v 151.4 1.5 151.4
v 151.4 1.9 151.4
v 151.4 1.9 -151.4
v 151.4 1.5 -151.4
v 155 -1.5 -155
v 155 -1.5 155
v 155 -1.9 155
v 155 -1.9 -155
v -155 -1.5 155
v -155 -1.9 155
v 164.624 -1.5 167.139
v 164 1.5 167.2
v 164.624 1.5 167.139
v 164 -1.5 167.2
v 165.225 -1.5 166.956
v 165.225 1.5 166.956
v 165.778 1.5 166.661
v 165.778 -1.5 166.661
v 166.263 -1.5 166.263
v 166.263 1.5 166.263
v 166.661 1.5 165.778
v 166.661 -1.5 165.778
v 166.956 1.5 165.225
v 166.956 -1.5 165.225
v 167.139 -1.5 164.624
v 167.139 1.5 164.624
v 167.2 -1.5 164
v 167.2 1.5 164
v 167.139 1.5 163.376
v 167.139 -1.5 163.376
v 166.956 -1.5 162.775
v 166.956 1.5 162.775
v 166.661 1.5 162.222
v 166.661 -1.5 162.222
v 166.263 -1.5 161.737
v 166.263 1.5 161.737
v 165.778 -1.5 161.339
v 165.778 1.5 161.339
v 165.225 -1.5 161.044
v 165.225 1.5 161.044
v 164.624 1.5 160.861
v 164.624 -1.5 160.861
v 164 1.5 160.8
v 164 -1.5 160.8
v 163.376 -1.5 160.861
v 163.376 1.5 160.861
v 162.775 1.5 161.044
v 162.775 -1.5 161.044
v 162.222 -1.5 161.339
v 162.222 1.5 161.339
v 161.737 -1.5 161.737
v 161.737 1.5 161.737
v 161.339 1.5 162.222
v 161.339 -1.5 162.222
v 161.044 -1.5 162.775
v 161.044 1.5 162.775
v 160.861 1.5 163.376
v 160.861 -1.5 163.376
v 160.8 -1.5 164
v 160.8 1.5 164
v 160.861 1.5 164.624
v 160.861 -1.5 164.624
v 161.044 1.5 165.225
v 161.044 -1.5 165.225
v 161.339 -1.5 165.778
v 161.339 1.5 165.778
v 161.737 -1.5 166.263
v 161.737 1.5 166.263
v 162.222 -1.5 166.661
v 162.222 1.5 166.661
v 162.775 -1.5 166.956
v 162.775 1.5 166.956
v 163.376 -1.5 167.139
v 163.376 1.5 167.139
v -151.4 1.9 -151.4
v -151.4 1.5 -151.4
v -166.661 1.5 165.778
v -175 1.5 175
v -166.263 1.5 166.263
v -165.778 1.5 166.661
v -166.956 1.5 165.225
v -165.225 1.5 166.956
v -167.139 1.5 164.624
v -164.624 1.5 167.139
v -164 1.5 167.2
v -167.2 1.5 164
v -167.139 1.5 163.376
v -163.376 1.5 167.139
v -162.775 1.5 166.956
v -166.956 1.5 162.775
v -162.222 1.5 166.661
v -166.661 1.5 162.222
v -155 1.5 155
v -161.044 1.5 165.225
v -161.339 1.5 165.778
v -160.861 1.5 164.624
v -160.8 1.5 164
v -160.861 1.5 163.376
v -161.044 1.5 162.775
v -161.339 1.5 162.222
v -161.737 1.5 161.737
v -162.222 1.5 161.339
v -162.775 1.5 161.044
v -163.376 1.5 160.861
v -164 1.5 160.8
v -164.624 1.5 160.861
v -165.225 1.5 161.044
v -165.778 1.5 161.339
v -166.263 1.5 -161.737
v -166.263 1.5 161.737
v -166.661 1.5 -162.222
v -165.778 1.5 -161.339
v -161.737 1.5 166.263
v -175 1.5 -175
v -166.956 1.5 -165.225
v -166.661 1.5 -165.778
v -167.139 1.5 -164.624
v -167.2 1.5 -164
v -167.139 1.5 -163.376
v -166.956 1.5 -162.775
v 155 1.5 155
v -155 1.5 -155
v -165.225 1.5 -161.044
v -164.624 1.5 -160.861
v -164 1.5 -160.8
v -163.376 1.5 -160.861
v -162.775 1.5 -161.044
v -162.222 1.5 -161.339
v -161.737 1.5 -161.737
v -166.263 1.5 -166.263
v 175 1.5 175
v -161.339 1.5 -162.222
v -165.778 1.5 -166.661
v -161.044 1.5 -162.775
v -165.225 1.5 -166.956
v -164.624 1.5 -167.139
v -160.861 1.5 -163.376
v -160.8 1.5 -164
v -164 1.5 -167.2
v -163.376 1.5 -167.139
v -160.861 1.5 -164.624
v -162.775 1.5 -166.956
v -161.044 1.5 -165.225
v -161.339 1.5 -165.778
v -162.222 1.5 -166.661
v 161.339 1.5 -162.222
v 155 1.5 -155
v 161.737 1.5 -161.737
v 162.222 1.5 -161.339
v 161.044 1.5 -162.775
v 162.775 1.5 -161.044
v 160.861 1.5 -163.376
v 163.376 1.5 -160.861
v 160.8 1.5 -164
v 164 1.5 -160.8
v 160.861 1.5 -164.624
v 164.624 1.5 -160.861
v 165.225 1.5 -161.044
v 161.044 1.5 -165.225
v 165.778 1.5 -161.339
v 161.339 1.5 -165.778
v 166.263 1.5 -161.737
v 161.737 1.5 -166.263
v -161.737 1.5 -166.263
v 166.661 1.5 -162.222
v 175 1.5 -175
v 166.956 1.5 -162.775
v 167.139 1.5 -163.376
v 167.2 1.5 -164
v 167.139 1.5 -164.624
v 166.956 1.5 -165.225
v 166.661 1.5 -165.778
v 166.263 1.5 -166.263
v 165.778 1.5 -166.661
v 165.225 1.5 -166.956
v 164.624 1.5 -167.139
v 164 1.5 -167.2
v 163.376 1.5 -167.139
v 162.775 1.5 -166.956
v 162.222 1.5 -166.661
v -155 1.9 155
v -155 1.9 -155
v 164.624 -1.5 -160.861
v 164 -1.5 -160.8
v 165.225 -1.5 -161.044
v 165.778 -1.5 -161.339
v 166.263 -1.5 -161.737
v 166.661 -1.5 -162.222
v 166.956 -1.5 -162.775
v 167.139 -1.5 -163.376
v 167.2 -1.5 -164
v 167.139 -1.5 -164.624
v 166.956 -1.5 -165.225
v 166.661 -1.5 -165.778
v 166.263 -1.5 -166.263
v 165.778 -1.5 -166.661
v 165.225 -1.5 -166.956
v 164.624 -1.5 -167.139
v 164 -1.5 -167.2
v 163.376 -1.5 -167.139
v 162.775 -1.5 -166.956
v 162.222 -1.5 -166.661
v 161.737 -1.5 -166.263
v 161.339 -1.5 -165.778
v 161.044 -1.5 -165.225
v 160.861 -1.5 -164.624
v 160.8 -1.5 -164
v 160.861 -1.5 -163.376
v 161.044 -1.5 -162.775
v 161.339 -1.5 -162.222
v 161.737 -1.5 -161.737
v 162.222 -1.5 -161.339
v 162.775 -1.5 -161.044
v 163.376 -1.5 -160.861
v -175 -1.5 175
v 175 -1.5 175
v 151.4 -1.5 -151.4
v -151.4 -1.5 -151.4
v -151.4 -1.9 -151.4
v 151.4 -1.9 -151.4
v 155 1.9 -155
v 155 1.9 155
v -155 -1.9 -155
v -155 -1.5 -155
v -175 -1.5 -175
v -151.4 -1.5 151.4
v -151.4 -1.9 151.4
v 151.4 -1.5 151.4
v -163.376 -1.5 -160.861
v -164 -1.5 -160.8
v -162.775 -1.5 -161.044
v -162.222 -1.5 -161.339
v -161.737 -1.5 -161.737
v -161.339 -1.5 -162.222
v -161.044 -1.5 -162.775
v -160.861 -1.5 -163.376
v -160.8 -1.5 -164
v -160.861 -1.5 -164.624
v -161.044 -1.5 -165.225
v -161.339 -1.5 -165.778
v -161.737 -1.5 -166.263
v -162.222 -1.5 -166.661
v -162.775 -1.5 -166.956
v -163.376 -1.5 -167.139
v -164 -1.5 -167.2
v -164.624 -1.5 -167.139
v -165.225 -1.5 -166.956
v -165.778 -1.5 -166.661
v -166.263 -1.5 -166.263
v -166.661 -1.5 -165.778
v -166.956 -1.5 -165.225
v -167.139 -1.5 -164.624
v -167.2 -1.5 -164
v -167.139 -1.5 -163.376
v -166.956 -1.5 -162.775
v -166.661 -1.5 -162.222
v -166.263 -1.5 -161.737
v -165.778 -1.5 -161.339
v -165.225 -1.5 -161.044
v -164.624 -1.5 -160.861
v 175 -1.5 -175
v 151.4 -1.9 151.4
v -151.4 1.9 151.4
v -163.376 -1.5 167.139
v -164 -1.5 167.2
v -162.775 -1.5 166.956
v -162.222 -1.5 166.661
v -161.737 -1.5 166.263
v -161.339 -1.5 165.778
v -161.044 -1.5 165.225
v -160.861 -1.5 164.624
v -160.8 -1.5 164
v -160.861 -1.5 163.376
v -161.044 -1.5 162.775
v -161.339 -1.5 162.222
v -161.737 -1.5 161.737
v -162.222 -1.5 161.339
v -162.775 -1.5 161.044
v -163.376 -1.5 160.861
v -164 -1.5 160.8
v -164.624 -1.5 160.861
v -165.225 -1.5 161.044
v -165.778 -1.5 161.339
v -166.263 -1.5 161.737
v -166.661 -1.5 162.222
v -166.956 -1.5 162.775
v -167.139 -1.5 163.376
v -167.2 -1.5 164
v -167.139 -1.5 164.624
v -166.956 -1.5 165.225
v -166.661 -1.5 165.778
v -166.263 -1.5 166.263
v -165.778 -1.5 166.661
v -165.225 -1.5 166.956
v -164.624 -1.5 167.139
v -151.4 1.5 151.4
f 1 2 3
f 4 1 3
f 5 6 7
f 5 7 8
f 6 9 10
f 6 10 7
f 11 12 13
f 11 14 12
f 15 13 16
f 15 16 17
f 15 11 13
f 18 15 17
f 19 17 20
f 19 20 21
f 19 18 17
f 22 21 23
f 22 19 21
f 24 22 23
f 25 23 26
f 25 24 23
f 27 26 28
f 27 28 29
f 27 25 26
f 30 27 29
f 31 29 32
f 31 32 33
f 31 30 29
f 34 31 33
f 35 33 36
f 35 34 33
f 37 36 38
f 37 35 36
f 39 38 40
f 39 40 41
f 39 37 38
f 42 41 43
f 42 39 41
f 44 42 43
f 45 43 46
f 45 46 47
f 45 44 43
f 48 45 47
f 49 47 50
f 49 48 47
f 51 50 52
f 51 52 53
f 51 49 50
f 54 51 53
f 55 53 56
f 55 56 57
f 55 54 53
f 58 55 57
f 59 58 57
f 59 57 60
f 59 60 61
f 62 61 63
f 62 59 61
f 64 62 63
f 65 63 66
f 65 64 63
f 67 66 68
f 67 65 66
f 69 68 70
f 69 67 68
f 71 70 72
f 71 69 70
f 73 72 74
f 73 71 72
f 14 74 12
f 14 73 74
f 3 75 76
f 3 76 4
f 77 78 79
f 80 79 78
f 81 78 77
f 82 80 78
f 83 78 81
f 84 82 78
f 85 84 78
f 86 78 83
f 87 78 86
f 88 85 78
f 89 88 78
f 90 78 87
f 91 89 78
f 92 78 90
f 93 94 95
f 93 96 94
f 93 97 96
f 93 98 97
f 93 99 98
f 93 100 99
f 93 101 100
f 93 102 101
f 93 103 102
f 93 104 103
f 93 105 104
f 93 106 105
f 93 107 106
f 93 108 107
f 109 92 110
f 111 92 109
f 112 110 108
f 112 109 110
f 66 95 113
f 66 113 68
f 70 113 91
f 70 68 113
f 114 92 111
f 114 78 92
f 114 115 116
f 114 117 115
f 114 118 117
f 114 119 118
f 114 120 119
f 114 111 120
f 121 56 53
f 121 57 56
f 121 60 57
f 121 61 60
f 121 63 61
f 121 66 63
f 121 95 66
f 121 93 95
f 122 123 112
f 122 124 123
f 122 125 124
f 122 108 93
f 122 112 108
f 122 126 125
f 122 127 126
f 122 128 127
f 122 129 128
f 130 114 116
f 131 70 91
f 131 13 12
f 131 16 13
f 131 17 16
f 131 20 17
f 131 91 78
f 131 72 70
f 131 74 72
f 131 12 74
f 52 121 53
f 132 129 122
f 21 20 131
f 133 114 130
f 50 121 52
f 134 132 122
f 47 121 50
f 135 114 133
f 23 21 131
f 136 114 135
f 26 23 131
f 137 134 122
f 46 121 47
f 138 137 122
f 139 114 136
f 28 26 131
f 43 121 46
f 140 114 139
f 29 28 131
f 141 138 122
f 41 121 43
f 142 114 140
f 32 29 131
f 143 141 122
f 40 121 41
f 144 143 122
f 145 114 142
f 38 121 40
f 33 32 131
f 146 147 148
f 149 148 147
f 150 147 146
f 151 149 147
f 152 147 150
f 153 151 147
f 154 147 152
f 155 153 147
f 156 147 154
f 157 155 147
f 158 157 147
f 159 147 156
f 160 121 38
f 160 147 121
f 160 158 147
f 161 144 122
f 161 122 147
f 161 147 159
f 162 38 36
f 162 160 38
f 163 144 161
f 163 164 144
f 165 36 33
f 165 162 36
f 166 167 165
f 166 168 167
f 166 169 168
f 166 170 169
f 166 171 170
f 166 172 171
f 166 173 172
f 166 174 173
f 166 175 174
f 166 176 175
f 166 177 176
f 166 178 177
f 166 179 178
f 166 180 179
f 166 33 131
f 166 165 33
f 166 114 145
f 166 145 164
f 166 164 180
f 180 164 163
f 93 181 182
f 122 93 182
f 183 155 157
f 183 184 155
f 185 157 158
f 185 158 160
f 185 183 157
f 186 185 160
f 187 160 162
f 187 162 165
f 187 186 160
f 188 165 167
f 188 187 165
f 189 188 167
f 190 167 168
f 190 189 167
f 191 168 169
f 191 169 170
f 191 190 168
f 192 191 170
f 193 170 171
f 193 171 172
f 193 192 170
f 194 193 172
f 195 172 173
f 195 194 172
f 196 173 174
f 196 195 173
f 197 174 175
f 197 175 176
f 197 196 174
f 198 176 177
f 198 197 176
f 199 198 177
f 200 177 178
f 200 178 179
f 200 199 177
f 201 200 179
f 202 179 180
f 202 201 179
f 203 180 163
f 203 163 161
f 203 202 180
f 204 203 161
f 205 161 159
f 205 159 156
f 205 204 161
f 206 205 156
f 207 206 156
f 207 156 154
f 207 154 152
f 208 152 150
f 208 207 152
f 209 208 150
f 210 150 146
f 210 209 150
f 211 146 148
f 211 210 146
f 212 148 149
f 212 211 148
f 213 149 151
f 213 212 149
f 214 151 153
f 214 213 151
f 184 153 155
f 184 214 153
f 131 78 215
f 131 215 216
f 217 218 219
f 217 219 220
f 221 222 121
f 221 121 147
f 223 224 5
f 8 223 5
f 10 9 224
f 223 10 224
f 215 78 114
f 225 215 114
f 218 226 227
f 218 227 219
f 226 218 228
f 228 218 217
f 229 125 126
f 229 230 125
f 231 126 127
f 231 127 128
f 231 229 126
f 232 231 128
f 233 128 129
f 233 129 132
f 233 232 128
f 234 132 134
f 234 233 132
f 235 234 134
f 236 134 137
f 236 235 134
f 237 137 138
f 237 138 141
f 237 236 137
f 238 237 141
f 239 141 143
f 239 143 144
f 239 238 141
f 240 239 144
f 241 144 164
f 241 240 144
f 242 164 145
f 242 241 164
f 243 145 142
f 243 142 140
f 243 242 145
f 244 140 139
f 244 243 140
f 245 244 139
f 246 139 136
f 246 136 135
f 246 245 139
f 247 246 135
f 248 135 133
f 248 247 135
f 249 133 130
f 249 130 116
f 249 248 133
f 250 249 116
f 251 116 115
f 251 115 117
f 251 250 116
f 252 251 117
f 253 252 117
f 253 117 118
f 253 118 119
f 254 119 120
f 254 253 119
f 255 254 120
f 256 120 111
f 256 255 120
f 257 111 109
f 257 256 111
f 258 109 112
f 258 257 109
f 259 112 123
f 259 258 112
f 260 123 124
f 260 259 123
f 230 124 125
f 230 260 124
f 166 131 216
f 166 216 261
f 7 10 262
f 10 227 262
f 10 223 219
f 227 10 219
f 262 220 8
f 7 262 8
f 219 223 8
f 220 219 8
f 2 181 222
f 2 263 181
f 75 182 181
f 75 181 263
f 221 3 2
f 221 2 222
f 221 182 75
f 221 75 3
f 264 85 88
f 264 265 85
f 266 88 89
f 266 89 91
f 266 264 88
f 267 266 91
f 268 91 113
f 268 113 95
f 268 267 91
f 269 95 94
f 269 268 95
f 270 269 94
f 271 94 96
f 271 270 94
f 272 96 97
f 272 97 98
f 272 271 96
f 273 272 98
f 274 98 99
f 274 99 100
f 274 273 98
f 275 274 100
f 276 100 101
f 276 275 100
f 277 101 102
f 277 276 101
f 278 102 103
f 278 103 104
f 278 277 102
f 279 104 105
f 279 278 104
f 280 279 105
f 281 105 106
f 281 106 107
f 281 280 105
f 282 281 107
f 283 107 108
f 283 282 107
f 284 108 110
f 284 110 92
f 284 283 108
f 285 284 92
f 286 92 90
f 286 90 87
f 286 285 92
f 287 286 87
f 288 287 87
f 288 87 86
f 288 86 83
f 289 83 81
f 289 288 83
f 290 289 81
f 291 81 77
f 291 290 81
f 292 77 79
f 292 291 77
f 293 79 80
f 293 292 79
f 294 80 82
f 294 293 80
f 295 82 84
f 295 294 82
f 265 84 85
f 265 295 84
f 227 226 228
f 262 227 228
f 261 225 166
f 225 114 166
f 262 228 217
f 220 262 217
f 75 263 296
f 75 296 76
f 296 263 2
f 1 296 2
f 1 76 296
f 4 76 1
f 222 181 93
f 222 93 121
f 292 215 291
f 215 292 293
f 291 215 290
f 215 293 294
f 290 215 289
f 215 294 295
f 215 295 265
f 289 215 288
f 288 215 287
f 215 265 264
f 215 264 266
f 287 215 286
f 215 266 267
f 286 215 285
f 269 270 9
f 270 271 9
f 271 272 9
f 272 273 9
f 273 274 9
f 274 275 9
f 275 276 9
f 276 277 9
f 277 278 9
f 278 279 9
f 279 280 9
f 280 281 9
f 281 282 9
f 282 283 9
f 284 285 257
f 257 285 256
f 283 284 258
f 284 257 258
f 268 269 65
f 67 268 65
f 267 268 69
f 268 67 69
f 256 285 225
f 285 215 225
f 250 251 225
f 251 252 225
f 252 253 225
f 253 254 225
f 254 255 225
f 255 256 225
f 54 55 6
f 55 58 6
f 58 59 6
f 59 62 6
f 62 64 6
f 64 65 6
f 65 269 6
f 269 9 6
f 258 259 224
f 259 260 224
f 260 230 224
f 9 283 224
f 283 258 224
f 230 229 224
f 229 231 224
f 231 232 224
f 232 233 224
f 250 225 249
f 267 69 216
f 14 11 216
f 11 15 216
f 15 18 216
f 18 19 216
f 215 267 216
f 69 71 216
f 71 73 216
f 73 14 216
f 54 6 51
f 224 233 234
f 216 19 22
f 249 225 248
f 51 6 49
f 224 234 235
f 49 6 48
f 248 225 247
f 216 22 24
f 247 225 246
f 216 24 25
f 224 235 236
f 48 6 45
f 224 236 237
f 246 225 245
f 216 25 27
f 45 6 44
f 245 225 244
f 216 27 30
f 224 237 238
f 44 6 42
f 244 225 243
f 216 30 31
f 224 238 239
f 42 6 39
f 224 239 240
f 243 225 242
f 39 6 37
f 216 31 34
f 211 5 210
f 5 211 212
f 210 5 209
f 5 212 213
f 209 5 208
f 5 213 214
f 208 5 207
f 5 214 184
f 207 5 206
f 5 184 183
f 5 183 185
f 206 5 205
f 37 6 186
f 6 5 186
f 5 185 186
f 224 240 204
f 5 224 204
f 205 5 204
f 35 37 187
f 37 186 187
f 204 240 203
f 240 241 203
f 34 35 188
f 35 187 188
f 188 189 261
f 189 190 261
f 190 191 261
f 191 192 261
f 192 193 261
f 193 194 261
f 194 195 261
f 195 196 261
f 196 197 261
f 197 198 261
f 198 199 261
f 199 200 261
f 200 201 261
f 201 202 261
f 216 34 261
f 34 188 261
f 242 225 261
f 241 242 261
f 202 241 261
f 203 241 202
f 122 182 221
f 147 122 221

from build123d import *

# Parameters (mm, degrees)
SKETCH1_W                                      = 350
SKETCH1_H                                      = 350
SKETCH1_R                                      = 3.2
BASE_PLATE_STRUCTURAL_PANEL_DEPTH              = 1.5
SKETCH2_W                                      = 310
SKETCH2_H                                      = 310
SKETCH2_W_2                                    = 302.8
SKETCH2_H_2                                    = 302.8
BASE_PLATE_STRUCTURAL_PANEL_INSET_STIFFE_DEPTH = 1.9


with BuildPart() as part:
    # Sketch1 → Base plate structural panel (new, symmetric)
    with BuildSketch(Plane(origin=(0, 0, 0), x_dir=(1, 0, 0), z_dir=(0, 1, 0))):
        Rectangle(SKETCH1_W, SKETCH1_H)
        with Locations(Location((164, 164, 0), (0, 0, 270))):
            Circle(SKETCH1_R, mode=Mode.SUBTRACT)
        with Locations(Location((-164, 164, 0), (0, 0, 270))):
            Circle(SKETCH1_R, mode=Mode.SUBTRACT)
        with Locations(Location((164, -164, 0), (0, 0, 270))):
            Circle(SKETCH1_R, mode=Mode.SUBTRACT)
        with Locations(Location((-164, -164, 0), (0, 0, 270))):
            Circle(SKETCH1_R, mode=Mode.SUBTRACT)
    extrude(amount=BASE_PLATE_STRUCTURAL_PANEL_DEPTH, both=True)

    # Sketch2 → Base plate structural panel inset stiffener (add, symmetric)
    with BuildSketch(Plane(origin=(0, 0, 0), x_dir=(1, 0, 0), z_dir=(0, 1, 0))):
        Rectangle(SKETCH2_W, SKETCH2_H)
        Rectangle(SKETCH2_W_2, SKETCH2_H_2, mode=Mode.SUBTRACT)
    extrude(amount=BASE_PLATE_STRUCTURAL_PANEL_INSET_STIFFE_DEPTH, both=True)


solid = part.part
